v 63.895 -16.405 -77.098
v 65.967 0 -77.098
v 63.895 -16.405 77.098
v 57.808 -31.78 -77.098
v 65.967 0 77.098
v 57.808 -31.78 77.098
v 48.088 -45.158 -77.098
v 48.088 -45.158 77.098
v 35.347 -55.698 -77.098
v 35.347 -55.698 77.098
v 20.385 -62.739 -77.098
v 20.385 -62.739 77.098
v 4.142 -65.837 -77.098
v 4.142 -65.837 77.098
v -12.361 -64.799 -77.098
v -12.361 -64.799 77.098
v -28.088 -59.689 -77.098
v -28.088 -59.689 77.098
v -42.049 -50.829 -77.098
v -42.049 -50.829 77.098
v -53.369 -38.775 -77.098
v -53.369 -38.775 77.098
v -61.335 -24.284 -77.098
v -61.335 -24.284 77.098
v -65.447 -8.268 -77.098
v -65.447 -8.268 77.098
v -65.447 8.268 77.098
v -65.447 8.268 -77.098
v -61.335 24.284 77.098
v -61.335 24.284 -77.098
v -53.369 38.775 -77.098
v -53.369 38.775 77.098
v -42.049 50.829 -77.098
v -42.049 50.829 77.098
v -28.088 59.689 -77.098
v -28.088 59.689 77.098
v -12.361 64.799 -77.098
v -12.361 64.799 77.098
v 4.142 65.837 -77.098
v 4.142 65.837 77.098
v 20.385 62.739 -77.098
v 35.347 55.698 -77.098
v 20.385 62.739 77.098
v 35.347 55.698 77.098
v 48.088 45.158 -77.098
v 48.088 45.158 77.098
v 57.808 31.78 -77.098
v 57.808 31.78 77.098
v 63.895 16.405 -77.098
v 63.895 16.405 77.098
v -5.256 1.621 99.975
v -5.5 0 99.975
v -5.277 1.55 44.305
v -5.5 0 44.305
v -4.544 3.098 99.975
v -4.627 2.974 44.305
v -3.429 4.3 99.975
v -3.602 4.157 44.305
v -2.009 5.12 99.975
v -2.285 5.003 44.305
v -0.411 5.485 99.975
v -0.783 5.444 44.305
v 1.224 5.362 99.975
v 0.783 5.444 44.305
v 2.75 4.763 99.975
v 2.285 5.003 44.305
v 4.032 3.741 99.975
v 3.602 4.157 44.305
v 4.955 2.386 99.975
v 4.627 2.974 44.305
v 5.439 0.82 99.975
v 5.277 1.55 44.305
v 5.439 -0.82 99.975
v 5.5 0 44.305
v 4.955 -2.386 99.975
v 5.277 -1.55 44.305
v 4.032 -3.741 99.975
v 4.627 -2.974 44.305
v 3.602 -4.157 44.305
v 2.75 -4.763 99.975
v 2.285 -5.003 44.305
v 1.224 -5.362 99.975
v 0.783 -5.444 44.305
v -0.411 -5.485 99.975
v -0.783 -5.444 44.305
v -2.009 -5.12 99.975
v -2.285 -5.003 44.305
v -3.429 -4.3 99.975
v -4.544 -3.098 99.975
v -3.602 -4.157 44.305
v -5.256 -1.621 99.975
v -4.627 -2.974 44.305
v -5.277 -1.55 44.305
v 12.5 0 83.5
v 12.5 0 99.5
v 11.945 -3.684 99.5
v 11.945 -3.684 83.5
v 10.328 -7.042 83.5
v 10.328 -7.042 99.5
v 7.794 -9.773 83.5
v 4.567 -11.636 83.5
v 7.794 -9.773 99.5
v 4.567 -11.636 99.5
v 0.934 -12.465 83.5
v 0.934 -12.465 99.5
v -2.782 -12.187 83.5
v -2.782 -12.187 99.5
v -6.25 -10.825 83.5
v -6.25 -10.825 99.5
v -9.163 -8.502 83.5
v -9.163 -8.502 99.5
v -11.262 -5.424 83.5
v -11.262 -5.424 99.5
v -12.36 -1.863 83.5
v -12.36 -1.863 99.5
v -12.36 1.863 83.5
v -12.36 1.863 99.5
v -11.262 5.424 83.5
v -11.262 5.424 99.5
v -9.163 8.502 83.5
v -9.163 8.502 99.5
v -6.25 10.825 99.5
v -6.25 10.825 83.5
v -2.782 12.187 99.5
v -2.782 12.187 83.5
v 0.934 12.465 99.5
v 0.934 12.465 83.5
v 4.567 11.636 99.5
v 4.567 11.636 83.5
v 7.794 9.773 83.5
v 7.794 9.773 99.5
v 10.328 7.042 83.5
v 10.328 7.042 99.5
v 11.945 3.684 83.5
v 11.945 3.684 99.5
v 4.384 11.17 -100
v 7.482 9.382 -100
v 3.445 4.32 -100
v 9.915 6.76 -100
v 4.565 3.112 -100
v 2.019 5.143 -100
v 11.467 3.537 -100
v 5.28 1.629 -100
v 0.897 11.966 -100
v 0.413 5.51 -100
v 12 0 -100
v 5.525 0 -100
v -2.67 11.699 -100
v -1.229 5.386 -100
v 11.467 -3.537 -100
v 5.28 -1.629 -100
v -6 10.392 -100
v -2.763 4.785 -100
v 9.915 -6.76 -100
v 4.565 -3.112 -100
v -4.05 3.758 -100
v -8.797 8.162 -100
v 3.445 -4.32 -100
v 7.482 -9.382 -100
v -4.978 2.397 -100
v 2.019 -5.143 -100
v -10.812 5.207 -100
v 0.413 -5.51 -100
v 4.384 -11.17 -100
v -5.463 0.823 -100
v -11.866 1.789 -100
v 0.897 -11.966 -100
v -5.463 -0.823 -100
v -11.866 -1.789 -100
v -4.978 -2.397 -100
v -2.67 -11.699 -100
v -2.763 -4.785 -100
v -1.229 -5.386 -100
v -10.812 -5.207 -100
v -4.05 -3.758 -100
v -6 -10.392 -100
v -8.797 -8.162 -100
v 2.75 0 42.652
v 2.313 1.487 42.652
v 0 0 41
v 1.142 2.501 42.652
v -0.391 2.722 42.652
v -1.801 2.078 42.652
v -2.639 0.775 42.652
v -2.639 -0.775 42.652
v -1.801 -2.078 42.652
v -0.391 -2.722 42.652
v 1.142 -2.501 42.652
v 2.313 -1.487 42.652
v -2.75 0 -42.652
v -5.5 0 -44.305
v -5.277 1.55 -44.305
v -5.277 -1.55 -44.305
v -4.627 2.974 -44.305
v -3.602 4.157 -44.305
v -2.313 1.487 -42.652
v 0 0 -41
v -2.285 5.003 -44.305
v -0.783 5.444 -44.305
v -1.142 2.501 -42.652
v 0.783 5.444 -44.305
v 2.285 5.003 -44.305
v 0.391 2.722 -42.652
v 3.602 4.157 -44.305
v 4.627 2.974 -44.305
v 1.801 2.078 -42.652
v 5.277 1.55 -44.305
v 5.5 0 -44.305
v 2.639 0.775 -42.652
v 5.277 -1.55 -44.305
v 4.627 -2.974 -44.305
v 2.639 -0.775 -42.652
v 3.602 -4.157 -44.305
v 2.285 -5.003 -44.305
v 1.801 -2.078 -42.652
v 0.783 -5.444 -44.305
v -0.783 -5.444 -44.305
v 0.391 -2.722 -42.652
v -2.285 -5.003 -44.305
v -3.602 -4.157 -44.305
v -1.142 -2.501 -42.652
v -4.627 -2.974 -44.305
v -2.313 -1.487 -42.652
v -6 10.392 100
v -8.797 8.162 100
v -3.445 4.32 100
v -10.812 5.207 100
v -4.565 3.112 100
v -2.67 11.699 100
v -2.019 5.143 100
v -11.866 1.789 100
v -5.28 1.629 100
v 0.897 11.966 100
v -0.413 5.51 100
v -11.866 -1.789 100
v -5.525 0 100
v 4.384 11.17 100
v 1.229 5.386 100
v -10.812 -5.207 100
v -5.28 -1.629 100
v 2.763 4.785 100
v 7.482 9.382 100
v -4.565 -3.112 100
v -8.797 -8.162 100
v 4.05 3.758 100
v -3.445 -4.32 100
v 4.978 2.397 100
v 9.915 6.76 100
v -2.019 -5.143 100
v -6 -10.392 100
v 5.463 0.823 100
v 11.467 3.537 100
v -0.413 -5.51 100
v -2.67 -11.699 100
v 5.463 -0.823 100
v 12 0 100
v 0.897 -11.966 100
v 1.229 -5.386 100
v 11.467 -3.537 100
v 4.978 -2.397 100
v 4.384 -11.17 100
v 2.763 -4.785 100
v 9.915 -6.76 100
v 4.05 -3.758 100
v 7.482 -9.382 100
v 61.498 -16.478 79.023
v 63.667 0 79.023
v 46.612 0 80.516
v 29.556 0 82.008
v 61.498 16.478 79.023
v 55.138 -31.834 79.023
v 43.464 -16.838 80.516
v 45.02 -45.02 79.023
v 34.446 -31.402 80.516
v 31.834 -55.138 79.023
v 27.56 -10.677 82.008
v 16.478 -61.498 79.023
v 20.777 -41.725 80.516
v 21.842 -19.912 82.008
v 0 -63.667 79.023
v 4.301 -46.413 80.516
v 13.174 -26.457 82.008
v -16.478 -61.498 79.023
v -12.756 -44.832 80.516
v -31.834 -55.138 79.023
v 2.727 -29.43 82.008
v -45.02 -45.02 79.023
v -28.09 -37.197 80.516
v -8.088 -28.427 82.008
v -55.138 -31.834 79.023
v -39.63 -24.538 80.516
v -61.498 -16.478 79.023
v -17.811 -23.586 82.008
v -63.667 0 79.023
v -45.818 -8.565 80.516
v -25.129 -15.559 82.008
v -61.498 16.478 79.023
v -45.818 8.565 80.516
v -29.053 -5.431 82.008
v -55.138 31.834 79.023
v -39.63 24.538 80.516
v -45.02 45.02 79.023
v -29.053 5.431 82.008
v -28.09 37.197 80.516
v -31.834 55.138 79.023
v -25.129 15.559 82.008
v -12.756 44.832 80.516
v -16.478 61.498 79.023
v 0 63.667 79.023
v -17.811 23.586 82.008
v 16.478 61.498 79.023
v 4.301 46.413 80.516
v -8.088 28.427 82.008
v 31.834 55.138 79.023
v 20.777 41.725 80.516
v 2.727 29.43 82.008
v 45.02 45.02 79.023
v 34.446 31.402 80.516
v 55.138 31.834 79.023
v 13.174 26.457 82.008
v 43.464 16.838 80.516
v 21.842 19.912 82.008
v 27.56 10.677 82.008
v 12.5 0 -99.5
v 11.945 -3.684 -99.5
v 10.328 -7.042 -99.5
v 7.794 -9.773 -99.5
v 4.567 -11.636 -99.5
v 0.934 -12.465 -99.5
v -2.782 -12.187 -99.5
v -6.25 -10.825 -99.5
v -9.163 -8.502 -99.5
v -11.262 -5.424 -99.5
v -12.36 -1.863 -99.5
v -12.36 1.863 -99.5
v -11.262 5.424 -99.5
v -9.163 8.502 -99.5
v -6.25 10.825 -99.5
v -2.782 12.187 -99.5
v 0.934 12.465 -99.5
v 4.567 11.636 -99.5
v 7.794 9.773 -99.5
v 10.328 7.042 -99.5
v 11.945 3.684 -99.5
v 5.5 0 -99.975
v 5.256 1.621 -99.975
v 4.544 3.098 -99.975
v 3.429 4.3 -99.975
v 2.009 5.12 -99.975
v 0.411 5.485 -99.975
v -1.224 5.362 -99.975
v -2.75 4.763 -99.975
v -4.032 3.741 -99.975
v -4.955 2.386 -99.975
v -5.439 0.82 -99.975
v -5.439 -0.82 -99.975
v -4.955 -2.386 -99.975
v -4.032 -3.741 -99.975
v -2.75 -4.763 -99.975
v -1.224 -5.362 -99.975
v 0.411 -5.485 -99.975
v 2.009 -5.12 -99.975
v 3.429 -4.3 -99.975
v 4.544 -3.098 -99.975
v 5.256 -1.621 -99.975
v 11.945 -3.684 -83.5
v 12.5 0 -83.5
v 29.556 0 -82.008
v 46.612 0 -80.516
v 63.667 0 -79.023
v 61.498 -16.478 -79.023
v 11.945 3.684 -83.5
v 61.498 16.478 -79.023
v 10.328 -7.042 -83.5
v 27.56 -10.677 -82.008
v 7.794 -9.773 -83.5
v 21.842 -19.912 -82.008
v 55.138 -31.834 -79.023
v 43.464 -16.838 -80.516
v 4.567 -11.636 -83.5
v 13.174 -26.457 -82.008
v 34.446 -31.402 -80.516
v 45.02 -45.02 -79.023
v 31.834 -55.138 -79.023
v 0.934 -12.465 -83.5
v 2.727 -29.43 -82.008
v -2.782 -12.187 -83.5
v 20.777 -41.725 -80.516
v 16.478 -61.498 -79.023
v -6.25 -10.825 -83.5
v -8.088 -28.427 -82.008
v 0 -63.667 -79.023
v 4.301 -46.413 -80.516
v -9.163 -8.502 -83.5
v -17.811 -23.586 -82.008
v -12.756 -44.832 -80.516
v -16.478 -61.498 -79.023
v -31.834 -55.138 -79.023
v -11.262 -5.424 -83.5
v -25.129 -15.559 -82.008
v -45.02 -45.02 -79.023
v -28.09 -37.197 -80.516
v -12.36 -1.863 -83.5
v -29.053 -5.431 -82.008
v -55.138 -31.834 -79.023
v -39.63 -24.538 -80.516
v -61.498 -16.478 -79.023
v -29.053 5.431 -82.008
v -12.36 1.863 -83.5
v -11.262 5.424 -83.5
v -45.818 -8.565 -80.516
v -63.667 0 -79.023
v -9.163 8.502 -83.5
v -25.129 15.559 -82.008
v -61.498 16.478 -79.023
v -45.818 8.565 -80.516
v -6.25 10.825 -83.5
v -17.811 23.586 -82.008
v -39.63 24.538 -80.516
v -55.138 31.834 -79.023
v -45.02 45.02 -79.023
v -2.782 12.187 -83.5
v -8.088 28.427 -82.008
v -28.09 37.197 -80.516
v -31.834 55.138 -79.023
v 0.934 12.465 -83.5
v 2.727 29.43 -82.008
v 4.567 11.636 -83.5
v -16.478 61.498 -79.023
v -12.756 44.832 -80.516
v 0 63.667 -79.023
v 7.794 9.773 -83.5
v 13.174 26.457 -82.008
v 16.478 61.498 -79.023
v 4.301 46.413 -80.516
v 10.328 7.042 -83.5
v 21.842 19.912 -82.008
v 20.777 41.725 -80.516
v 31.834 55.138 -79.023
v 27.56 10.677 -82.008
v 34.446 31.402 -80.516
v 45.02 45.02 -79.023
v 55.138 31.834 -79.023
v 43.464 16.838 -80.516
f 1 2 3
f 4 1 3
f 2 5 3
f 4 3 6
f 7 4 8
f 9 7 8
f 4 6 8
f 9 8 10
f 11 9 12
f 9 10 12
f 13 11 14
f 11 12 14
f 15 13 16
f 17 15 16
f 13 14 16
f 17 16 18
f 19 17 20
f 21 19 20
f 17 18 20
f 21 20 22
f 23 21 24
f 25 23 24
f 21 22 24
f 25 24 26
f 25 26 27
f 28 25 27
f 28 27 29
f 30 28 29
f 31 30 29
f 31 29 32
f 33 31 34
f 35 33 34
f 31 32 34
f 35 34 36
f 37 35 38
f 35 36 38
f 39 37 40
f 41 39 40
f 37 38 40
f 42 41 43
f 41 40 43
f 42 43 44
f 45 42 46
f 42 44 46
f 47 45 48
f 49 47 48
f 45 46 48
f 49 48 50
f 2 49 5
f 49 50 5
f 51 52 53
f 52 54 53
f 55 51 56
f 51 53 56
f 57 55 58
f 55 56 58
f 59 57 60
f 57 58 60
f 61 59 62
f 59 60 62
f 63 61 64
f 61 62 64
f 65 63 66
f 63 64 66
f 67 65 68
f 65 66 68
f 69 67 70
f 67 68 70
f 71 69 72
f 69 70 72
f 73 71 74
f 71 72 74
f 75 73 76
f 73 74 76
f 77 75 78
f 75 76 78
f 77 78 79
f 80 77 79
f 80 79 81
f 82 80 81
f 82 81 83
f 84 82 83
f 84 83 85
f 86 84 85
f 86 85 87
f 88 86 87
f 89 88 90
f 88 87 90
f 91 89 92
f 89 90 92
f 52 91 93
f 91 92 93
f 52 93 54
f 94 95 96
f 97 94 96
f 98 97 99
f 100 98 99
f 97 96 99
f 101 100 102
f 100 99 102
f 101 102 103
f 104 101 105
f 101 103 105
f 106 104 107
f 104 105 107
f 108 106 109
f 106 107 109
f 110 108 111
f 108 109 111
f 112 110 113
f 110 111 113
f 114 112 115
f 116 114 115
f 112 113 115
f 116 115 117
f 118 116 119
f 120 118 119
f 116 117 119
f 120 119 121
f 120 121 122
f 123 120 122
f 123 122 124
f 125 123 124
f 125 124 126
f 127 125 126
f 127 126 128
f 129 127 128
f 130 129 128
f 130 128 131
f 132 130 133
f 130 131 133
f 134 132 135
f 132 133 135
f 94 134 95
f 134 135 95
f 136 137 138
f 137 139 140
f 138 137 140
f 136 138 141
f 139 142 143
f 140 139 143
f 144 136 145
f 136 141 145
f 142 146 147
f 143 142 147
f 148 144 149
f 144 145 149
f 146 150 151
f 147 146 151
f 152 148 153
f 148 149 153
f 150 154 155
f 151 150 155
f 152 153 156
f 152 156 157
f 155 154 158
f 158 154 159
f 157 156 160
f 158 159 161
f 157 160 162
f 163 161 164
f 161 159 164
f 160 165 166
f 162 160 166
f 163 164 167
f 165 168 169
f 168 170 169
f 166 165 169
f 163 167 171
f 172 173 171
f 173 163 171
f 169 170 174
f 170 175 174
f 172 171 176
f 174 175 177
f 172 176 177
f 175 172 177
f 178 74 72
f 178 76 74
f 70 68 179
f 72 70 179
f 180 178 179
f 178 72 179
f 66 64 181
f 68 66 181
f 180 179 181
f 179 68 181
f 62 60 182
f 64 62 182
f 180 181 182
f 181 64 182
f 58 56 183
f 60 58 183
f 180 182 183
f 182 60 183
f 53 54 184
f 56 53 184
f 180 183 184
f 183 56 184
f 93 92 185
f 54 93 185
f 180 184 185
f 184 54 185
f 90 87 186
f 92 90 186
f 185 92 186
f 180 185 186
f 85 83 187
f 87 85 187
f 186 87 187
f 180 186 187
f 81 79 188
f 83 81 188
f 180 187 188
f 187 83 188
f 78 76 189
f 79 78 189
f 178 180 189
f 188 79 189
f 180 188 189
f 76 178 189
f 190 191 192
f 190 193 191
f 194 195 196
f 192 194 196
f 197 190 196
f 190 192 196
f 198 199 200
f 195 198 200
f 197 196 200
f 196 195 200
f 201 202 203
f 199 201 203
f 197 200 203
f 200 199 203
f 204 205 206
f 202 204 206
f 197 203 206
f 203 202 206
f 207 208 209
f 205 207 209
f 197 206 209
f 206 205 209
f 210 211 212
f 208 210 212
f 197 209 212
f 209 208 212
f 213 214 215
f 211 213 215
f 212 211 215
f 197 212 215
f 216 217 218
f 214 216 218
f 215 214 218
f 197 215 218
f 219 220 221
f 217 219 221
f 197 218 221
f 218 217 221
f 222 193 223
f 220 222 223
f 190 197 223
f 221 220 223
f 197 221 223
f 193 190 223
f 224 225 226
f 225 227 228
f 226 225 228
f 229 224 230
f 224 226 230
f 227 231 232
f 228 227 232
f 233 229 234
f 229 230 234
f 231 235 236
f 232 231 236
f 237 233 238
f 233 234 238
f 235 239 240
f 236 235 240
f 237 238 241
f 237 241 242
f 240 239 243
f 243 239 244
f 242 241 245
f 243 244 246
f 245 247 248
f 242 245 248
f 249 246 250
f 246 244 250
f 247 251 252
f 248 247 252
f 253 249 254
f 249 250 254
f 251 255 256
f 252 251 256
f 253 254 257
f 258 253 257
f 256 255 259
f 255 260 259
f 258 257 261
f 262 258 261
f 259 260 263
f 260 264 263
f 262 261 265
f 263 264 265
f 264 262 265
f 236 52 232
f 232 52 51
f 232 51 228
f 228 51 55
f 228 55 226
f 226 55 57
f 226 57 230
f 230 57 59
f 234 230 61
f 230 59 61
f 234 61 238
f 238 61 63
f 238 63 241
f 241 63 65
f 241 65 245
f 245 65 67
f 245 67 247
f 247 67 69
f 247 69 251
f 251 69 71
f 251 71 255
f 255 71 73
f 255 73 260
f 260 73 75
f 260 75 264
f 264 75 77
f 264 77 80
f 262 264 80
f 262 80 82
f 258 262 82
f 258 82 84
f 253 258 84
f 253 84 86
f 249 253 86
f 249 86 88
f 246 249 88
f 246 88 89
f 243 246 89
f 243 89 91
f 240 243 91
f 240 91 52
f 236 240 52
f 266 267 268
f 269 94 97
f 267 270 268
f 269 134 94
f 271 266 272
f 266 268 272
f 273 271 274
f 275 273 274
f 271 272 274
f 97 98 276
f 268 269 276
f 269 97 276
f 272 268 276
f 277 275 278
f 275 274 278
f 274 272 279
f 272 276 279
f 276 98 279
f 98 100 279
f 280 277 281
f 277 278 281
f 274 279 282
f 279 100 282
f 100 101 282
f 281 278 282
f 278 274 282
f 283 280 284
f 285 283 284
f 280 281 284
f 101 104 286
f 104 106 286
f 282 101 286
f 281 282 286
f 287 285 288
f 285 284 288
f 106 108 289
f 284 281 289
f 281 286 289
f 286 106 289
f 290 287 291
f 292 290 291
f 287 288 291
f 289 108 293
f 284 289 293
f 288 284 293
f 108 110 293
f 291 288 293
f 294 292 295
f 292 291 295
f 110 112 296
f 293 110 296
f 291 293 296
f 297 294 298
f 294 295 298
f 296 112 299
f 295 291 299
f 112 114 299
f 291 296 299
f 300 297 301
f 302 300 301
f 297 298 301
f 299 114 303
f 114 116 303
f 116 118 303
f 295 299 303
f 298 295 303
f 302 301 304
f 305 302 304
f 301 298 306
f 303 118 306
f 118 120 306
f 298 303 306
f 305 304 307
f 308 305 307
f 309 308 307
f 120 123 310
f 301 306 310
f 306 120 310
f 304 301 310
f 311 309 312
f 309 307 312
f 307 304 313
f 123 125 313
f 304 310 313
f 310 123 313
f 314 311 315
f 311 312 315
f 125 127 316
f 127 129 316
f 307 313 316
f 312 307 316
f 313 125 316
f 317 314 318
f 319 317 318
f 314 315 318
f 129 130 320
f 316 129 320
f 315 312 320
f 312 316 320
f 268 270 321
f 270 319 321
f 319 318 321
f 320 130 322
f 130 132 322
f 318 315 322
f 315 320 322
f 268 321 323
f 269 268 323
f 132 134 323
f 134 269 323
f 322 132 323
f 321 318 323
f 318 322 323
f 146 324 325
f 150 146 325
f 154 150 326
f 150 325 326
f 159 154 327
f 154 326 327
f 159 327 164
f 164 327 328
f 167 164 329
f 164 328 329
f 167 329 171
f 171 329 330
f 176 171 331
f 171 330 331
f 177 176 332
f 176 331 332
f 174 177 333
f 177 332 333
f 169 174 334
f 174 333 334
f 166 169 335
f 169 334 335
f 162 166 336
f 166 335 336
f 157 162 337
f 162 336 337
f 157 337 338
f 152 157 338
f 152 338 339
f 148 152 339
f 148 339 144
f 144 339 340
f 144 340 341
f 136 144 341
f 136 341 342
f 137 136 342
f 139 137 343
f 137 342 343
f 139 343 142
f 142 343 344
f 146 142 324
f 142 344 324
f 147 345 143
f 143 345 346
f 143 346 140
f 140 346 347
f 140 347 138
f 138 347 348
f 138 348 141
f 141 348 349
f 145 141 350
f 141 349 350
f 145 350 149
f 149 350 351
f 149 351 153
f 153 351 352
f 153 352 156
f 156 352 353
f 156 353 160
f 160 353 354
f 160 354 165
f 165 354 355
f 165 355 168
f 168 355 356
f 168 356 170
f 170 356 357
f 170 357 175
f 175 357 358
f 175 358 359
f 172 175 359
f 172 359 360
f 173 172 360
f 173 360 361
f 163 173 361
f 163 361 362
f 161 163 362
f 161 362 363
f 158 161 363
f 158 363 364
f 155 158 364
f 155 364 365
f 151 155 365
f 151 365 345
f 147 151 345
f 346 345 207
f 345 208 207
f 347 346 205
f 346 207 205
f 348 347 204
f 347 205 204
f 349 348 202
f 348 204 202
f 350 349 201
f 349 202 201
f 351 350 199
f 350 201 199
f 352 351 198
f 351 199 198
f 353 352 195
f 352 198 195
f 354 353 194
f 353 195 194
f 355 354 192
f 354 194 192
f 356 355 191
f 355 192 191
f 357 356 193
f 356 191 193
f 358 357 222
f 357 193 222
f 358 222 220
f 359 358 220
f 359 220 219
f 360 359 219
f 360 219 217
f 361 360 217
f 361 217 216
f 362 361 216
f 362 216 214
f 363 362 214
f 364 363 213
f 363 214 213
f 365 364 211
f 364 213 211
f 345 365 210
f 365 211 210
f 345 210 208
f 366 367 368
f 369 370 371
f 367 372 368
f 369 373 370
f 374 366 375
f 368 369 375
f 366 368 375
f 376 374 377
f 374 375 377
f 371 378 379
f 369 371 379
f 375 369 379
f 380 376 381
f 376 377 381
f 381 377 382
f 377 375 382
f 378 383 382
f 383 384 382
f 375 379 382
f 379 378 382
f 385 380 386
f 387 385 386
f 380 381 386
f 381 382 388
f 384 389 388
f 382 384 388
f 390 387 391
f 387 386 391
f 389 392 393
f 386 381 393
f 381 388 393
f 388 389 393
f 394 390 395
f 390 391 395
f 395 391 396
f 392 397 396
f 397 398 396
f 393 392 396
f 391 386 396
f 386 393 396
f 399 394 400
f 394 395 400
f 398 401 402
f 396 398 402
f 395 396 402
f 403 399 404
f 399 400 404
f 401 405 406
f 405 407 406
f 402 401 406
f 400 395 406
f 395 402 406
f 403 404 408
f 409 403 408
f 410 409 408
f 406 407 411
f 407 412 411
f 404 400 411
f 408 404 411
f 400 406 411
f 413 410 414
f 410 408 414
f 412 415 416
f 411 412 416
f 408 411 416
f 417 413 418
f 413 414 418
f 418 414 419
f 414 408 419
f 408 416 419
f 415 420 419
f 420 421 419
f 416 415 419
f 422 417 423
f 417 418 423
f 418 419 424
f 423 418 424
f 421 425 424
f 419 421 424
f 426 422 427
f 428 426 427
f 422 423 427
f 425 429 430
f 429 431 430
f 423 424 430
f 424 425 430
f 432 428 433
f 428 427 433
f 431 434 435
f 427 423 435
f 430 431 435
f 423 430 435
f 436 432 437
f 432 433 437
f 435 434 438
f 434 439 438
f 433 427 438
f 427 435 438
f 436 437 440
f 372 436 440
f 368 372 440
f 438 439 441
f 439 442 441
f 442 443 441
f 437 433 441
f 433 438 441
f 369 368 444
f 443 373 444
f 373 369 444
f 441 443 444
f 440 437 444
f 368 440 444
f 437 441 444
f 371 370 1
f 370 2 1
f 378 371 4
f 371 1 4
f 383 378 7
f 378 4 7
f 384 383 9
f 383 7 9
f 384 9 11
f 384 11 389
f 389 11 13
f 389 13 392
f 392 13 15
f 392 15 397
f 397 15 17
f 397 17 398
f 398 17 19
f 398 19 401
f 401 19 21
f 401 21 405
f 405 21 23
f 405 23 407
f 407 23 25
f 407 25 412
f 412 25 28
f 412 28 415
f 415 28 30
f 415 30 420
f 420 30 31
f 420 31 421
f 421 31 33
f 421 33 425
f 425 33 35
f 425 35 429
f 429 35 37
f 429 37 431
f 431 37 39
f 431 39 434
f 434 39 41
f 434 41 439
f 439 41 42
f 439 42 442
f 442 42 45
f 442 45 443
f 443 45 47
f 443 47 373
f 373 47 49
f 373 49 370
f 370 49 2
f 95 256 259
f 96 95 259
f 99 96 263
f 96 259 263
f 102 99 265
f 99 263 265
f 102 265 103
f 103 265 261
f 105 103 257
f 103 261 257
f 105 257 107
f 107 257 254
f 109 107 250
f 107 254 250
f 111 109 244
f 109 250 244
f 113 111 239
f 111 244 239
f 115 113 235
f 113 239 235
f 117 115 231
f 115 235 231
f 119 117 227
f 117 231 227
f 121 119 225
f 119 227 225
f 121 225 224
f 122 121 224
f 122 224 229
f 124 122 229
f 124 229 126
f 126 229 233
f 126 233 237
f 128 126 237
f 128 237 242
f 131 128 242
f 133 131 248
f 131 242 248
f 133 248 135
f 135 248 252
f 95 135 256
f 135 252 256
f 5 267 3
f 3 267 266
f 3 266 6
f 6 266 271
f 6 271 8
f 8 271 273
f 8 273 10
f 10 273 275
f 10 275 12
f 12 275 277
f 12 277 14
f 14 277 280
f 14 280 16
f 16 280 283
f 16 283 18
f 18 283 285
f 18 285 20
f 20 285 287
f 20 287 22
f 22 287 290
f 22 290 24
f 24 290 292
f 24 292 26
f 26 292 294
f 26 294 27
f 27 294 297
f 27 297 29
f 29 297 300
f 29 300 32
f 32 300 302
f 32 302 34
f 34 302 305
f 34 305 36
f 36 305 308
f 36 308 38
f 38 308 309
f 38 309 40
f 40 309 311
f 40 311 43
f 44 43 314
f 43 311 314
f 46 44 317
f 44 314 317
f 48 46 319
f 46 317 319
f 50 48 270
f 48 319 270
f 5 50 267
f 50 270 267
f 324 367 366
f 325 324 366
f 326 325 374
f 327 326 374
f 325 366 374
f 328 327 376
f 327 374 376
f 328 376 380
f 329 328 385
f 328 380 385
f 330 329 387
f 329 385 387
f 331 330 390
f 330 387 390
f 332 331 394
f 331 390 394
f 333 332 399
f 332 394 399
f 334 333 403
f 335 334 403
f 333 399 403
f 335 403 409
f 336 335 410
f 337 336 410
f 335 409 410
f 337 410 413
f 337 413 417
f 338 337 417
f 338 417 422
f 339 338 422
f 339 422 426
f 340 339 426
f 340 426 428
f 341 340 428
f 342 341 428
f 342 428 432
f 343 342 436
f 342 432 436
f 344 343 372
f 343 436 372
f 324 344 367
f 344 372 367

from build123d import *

# Parameters (mm, degrees)
M10_CLEARANCE_HOLE2_D                     = 11
M10_CLEARANCE_HOLE2_DEPTH                 = 55.695266595
M10_CLEARANCE_HOLE2_CSINK_D               = 11.05
M10_CLEARANCE_HOLE2_CSINK_ANGLE           = 90
M10_CLEARANCE_HOLE2_TIP                   = 3.304733405
M10_CLEARANCE_HOLE2_ON_FACE_2_D           = 11
M10_CLEARANCE_HOLE2_ON_FACE_2_DEPTH       = 55.695266595
M10_CLEARANCE_HOLE2_ON_FACE_2_CSINK_D     = 11.05
M10_CLEARANCE_HOLE2_ON_FACE_2_CSINK_ANGLE = 90
M10_CLEARANCE_HOLE2_ON_FACE_2_TIP         = 3.304733405
CHAMFER1_SIZE                             = 0.5


with BuildPart() as part:
    # Sketch1 → Revolve1 (revolve)
    with BuildSketch(Plane(origin=(0, 0, 0), x_dir=(0, 0, -1), z_dir=(1, 0, 0)), mode=Mode.PRIVATE) as revolve1_sk:
        Polygon((-100, 0), (100, 0), (100, 12.5), (83.5, 12.5), (79.023440019, 63.66731472), (77.097512539, 65.967489352), (-77.097512539, 65.967489352), (-79.023440019, 63.66731472), (-83.5, 12.5), (-100, 12.5), align=None)
    revolve(revolve1_sk.sketch.rotate(Axis((0, 0, 100), (0, 0, -1)), 90), axis=Axis((0, 0, 100), (0, 0, -1)))

    # M10 Clearance Hole2
    with Locations(Plane(origin=(0, 0, -100), x_dir=(-1, 0, 0), z_dir=(0, 0, -1))):
        with Locations((0, 0)):
            CounterSinkHole(M10_CLEARANCE_HOLE2_D / 2, M10_CLEARANCE_HOLE2_CSINK_D / 2, depth=M10_CLEARANCE_HOLE2_DEPTH, counter_sink_angle=M10_CLEARANCE_HOLE2_CSINK_ANGLE)
            with Locations((0, 0, -(M10_CLEARANCE_HOLE2_DEPTH + M10_CLEARANCE_HOLE2_TIP / 2))):  # 118° drill point
                Cone(0, M10_CLEARANCE_HOLE2_D / 2, M10_CLEARANCE_HOLE2_TIP, mode=Mode.SUBTRACT)

    # M10 Clearance Hole2 on face 2
    with Locations(Plane.XY.offset(100)):
        with Locations((0, 0)):
            CounterSinkHole(M10_CLEARANCE_HOLE2_ON_FACE_2_D / 2, M10_CLEARANCE_HOLE2_ON_FACE_2_CSINK_D / 2, depth=M10_CLEARANCE_HOLE2_ON_FACE_2_DEPTH, counter_sink_angle=M10_CLEARANCE_HOLE2_ON_FACE_2_CSINK_ANGLE)
            with Locations((0, 0, -(M10_CLEARANCE_HOLE2_ON_FACE_2_DEPTH + M10_CLEARANCE_HOLE2_ON_FACE_2_TIP / 2))):  # 118° drill point
                Cone(0, M10_CLEARANCE_HOLE2_ON_FACE_2_D / 2, M10_CLEARANCE_HOLE2_ON_FACE_2_TIP, mode=Mode.SUBTRACT)

    # Chamfer1
    chamfer1_edges = [part.edges().sort_by_distance(p)[0] for p in [
        (-12.5, 0, -100),
        (-12.5, 0, 100),
    ]]
    chamfer(chamfer1_edges, length=CHAMFER1_SIZE)


solid = part.part
